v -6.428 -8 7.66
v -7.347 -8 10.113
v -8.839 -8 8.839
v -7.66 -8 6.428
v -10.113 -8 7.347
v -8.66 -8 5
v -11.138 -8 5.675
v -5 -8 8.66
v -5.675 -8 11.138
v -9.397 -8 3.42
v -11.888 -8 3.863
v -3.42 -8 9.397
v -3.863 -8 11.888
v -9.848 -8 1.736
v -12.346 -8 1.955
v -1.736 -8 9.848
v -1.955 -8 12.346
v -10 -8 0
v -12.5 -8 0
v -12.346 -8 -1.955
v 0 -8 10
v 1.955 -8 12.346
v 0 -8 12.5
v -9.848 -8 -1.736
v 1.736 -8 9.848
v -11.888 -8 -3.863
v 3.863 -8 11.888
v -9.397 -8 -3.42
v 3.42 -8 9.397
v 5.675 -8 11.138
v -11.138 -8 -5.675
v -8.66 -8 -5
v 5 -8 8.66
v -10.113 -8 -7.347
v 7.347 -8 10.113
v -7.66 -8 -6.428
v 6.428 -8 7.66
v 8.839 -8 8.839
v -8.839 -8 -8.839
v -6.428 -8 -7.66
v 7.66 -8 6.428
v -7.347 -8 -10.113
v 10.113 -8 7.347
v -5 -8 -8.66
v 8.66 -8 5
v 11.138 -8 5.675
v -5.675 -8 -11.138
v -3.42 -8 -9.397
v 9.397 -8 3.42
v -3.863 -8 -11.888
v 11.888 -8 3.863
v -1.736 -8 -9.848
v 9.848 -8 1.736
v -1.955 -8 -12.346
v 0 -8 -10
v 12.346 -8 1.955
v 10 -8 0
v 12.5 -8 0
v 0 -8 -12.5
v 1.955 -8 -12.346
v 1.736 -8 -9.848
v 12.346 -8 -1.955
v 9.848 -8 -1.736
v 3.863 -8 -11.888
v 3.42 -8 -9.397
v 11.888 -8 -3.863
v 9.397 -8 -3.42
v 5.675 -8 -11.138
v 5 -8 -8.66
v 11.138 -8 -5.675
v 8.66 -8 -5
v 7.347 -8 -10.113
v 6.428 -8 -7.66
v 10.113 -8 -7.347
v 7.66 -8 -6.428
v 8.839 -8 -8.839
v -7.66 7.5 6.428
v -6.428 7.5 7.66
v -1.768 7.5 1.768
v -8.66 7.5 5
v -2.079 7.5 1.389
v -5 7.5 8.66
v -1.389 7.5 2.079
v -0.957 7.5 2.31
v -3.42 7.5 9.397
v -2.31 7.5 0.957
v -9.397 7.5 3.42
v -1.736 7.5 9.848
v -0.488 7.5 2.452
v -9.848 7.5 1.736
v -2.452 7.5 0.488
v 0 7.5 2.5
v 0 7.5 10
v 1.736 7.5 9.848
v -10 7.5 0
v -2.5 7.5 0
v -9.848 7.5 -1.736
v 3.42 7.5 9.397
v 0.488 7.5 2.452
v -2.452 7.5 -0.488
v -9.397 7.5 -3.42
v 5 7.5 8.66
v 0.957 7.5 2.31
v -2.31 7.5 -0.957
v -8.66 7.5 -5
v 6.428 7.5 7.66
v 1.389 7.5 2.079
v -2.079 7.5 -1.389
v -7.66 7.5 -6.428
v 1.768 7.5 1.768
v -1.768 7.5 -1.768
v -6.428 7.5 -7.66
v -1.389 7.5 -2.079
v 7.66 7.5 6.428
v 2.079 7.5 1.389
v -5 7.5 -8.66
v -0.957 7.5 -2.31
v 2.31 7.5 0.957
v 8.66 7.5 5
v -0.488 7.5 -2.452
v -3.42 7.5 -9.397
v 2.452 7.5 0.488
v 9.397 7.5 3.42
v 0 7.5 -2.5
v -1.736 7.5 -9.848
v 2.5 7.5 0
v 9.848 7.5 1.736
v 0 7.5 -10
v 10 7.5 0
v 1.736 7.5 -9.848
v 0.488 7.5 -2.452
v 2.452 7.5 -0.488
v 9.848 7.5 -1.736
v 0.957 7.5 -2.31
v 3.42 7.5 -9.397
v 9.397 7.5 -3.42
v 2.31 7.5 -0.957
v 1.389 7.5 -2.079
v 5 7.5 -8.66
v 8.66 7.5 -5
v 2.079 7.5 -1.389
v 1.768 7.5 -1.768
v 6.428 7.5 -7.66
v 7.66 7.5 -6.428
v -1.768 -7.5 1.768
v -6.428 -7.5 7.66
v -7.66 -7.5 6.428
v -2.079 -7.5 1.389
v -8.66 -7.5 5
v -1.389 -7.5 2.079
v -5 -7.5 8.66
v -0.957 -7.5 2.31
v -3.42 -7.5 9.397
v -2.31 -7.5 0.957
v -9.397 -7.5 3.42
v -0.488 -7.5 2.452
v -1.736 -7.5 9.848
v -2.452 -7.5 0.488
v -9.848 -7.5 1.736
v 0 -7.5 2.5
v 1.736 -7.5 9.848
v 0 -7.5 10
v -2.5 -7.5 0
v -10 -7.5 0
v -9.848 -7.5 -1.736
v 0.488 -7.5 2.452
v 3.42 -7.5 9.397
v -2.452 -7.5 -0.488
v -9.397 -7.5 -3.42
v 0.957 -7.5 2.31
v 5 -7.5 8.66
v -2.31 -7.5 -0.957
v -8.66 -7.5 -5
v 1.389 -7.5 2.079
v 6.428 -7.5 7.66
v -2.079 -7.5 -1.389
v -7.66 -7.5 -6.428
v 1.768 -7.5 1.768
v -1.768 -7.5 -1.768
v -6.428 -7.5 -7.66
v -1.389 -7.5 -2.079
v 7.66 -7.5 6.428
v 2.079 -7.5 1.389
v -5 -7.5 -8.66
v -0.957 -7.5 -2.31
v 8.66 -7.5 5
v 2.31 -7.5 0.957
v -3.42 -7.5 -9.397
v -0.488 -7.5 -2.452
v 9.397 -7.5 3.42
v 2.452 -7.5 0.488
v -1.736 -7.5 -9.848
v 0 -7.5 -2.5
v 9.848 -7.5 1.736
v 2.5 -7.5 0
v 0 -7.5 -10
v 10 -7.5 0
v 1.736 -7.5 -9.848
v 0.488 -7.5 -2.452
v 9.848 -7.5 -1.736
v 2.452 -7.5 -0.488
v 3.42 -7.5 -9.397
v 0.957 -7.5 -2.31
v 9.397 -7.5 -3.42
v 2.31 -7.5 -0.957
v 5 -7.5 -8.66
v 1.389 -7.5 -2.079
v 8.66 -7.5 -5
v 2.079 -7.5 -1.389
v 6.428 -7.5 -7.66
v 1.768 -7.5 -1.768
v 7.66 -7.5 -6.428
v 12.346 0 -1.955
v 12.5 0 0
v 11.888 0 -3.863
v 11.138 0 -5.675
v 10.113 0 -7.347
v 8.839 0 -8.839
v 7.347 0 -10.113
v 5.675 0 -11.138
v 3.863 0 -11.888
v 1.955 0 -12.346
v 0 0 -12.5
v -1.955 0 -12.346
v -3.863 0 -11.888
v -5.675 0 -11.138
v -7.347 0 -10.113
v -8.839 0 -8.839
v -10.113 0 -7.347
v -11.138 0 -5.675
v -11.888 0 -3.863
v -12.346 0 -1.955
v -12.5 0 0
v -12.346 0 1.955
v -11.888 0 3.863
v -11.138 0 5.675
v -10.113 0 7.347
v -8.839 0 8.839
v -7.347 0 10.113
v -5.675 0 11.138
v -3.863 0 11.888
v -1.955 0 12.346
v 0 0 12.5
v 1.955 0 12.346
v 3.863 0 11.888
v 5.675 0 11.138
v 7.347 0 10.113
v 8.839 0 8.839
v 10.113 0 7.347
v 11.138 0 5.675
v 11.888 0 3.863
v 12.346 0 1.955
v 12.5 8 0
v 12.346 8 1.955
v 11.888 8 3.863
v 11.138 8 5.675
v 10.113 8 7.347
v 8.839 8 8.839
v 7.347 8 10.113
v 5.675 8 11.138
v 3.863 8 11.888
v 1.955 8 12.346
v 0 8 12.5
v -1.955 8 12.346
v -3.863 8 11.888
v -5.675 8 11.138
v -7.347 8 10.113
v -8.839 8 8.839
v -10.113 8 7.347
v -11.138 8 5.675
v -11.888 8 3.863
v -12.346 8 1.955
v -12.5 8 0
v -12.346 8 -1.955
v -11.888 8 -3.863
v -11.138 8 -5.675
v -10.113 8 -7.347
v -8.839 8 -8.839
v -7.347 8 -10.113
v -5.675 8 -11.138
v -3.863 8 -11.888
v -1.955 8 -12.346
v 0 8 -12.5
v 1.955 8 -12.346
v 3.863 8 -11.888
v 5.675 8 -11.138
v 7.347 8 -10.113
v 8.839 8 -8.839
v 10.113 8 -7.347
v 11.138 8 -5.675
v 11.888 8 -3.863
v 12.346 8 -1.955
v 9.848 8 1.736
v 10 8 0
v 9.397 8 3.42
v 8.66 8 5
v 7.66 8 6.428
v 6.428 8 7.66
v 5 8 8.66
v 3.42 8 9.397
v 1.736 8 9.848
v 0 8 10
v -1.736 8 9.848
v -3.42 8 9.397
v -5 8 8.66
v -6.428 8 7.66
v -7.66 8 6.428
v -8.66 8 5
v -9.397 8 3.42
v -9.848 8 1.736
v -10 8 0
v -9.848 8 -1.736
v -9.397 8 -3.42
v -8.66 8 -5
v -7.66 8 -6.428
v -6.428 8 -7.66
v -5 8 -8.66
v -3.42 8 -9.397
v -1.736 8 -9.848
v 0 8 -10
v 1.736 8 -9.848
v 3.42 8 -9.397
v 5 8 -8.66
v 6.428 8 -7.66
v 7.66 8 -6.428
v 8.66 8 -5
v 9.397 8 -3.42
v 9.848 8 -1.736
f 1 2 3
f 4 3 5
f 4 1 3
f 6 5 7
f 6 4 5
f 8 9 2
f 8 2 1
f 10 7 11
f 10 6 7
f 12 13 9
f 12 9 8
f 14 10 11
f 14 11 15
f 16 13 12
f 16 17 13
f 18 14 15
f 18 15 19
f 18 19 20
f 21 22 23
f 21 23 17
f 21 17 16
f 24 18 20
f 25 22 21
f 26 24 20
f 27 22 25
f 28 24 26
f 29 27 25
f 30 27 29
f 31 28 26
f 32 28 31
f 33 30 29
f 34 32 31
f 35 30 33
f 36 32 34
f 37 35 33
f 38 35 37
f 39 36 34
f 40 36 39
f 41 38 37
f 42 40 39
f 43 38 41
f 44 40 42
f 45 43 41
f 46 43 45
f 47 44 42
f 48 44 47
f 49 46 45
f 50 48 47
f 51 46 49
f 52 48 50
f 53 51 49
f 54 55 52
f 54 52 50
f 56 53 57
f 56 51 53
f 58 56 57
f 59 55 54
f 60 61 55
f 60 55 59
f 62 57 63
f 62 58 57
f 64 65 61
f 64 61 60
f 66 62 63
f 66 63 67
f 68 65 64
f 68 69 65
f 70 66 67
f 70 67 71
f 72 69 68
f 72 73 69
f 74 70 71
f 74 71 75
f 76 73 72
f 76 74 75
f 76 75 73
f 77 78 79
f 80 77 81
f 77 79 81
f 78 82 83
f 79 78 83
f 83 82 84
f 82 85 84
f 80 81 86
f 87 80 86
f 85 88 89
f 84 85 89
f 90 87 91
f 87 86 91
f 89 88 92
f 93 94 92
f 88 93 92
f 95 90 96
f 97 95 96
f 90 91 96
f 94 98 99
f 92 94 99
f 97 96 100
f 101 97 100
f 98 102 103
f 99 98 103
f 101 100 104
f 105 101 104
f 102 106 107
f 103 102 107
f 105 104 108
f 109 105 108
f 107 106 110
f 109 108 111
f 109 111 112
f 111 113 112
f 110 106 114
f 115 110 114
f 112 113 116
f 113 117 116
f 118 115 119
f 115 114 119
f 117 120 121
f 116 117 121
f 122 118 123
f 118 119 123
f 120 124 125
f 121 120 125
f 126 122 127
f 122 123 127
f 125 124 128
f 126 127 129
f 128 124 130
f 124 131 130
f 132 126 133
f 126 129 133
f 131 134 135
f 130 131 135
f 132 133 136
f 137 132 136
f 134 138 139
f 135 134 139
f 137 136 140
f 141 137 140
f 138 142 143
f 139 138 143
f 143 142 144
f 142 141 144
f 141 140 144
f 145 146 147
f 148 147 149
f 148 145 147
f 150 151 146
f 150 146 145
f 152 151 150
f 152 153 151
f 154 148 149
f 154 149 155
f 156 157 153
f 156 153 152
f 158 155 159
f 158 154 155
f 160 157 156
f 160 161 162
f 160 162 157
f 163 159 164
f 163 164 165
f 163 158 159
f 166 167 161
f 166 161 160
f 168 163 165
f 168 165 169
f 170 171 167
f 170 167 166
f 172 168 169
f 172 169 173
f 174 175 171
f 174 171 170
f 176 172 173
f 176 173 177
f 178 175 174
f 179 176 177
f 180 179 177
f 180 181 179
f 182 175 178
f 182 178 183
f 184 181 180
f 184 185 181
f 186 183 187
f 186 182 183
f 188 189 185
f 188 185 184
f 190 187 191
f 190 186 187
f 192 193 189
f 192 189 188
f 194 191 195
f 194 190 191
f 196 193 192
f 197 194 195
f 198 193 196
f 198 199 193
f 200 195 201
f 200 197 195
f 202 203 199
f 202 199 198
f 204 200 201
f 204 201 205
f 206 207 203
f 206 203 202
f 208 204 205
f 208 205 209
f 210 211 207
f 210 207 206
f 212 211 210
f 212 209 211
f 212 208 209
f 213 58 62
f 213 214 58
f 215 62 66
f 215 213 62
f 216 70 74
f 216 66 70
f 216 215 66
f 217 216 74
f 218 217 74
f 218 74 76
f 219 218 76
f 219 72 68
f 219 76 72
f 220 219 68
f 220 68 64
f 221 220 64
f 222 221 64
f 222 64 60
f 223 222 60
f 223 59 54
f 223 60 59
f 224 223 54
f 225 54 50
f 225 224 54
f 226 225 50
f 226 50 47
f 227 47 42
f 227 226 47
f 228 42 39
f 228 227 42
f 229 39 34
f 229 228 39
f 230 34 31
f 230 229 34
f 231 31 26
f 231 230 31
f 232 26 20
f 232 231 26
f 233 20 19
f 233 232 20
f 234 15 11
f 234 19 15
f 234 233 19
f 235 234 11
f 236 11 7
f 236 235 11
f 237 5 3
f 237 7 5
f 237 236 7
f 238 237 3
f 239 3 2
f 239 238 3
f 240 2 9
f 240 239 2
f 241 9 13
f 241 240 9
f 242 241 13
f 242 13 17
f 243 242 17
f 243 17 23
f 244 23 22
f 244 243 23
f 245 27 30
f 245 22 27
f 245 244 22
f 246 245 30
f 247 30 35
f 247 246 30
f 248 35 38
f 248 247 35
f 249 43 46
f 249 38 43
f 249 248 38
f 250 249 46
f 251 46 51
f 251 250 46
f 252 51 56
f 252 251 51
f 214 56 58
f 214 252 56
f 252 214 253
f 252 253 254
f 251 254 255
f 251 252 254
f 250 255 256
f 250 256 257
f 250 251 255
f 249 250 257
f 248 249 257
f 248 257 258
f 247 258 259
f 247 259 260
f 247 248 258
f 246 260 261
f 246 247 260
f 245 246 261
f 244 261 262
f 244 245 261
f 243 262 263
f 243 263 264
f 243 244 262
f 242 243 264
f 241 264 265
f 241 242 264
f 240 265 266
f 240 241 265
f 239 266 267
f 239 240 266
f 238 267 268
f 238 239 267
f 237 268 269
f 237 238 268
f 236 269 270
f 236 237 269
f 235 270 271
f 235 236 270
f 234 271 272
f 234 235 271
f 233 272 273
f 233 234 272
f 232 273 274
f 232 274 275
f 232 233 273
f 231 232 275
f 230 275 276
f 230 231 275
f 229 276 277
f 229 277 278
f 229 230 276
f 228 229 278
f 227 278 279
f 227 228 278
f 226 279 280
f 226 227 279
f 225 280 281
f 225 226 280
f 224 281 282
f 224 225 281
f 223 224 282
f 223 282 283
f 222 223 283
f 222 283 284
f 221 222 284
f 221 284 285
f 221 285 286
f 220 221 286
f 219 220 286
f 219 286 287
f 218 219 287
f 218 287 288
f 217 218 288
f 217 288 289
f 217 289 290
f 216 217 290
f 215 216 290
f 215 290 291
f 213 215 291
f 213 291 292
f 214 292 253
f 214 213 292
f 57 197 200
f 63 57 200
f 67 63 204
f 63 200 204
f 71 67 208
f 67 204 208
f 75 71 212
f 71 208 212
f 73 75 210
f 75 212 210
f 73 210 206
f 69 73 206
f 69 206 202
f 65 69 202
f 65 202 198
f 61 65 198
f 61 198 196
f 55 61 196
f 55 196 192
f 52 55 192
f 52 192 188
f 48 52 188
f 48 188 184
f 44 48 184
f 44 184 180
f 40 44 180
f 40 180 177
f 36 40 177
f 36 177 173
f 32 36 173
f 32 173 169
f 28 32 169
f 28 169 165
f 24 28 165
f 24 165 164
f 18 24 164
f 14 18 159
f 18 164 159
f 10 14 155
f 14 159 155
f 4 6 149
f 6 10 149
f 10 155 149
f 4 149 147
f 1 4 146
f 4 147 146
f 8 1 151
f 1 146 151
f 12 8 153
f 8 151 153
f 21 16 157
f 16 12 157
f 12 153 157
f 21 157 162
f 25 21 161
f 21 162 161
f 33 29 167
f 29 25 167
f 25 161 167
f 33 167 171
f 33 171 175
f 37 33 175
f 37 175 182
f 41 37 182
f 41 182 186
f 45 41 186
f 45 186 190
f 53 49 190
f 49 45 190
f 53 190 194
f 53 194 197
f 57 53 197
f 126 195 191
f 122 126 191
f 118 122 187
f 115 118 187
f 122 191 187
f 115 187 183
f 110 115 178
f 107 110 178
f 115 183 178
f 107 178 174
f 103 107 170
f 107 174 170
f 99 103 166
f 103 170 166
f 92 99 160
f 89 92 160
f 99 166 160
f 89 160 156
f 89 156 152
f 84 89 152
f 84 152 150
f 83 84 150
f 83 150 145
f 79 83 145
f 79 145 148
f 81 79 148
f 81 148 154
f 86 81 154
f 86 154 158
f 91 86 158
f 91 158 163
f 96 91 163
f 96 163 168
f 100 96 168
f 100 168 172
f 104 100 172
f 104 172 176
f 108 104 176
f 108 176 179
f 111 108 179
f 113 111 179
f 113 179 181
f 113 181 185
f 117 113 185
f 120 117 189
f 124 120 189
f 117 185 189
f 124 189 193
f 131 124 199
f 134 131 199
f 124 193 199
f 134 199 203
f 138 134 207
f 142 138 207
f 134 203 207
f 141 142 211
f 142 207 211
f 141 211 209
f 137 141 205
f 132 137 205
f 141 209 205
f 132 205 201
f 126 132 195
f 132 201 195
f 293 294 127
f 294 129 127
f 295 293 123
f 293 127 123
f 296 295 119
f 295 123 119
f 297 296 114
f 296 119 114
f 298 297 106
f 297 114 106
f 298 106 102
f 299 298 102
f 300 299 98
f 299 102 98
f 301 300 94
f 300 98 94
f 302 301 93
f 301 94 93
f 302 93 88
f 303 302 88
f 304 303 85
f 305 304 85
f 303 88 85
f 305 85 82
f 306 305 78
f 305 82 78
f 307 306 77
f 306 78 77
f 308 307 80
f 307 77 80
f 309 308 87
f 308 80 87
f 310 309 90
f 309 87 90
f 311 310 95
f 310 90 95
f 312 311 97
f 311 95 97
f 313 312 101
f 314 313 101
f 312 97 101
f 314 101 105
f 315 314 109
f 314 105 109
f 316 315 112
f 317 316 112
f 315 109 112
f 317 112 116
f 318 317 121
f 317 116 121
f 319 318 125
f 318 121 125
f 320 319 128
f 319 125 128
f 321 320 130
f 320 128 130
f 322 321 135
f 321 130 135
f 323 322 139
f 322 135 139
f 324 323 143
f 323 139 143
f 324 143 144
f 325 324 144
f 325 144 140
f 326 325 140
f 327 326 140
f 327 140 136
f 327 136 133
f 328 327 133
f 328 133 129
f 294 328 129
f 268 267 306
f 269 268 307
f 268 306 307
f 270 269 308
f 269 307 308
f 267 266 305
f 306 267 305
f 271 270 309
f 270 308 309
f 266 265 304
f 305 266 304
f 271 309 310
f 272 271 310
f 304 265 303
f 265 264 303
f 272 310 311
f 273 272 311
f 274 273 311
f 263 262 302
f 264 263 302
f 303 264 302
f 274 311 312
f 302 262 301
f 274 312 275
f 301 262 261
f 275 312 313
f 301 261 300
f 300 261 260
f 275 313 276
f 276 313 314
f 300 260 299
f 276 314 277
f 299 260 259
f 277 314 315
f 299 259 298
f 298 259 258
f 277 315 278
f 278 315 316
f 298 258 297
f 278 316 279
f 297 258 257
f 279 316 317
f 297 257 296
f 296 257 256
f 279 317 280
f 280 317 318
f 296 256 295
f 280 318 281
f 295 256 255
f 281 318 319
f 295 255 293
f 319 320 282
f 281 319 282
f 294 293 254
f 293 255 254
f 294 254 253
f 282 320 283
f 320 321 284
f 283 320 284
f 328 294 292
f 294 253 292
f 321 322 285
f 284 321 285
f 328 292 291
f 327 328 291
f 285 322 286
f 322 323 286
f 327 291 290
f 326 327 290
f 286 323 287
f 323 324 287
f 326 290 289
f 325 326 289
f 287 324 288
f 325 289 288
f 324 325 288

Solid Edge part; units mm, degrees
sketch "Sketch1" plane through (0, 0, 0) normal (0, -1, 0) x (1, 0, 0)
  circle A0 centre (0, 0) radius 10
extrude "Protrusion1" add sketch "Sketch1" along normal mid plane 15
sketch "Sketch2" plane through (0, 0, 0) normal (0, -1, 0) x (1, 0, 0)
  circle A0 centre (0, 0) radius 12.5
  circle A1 centre (0, 0) radius 10
extrude "ExtrudedProtrusion_3" add sketch "Sketch2" along normal mid plane 16
sketch "Sketch3" plane through (0, -7.5, 0) normal (0, -1, 0) x (1, 0, 0)
  circle A0 centre (0, 0) radius 2.5
extrude "ExtrudedCutout_1" cut sketch "Sketch3" against normal blind 20.7581
